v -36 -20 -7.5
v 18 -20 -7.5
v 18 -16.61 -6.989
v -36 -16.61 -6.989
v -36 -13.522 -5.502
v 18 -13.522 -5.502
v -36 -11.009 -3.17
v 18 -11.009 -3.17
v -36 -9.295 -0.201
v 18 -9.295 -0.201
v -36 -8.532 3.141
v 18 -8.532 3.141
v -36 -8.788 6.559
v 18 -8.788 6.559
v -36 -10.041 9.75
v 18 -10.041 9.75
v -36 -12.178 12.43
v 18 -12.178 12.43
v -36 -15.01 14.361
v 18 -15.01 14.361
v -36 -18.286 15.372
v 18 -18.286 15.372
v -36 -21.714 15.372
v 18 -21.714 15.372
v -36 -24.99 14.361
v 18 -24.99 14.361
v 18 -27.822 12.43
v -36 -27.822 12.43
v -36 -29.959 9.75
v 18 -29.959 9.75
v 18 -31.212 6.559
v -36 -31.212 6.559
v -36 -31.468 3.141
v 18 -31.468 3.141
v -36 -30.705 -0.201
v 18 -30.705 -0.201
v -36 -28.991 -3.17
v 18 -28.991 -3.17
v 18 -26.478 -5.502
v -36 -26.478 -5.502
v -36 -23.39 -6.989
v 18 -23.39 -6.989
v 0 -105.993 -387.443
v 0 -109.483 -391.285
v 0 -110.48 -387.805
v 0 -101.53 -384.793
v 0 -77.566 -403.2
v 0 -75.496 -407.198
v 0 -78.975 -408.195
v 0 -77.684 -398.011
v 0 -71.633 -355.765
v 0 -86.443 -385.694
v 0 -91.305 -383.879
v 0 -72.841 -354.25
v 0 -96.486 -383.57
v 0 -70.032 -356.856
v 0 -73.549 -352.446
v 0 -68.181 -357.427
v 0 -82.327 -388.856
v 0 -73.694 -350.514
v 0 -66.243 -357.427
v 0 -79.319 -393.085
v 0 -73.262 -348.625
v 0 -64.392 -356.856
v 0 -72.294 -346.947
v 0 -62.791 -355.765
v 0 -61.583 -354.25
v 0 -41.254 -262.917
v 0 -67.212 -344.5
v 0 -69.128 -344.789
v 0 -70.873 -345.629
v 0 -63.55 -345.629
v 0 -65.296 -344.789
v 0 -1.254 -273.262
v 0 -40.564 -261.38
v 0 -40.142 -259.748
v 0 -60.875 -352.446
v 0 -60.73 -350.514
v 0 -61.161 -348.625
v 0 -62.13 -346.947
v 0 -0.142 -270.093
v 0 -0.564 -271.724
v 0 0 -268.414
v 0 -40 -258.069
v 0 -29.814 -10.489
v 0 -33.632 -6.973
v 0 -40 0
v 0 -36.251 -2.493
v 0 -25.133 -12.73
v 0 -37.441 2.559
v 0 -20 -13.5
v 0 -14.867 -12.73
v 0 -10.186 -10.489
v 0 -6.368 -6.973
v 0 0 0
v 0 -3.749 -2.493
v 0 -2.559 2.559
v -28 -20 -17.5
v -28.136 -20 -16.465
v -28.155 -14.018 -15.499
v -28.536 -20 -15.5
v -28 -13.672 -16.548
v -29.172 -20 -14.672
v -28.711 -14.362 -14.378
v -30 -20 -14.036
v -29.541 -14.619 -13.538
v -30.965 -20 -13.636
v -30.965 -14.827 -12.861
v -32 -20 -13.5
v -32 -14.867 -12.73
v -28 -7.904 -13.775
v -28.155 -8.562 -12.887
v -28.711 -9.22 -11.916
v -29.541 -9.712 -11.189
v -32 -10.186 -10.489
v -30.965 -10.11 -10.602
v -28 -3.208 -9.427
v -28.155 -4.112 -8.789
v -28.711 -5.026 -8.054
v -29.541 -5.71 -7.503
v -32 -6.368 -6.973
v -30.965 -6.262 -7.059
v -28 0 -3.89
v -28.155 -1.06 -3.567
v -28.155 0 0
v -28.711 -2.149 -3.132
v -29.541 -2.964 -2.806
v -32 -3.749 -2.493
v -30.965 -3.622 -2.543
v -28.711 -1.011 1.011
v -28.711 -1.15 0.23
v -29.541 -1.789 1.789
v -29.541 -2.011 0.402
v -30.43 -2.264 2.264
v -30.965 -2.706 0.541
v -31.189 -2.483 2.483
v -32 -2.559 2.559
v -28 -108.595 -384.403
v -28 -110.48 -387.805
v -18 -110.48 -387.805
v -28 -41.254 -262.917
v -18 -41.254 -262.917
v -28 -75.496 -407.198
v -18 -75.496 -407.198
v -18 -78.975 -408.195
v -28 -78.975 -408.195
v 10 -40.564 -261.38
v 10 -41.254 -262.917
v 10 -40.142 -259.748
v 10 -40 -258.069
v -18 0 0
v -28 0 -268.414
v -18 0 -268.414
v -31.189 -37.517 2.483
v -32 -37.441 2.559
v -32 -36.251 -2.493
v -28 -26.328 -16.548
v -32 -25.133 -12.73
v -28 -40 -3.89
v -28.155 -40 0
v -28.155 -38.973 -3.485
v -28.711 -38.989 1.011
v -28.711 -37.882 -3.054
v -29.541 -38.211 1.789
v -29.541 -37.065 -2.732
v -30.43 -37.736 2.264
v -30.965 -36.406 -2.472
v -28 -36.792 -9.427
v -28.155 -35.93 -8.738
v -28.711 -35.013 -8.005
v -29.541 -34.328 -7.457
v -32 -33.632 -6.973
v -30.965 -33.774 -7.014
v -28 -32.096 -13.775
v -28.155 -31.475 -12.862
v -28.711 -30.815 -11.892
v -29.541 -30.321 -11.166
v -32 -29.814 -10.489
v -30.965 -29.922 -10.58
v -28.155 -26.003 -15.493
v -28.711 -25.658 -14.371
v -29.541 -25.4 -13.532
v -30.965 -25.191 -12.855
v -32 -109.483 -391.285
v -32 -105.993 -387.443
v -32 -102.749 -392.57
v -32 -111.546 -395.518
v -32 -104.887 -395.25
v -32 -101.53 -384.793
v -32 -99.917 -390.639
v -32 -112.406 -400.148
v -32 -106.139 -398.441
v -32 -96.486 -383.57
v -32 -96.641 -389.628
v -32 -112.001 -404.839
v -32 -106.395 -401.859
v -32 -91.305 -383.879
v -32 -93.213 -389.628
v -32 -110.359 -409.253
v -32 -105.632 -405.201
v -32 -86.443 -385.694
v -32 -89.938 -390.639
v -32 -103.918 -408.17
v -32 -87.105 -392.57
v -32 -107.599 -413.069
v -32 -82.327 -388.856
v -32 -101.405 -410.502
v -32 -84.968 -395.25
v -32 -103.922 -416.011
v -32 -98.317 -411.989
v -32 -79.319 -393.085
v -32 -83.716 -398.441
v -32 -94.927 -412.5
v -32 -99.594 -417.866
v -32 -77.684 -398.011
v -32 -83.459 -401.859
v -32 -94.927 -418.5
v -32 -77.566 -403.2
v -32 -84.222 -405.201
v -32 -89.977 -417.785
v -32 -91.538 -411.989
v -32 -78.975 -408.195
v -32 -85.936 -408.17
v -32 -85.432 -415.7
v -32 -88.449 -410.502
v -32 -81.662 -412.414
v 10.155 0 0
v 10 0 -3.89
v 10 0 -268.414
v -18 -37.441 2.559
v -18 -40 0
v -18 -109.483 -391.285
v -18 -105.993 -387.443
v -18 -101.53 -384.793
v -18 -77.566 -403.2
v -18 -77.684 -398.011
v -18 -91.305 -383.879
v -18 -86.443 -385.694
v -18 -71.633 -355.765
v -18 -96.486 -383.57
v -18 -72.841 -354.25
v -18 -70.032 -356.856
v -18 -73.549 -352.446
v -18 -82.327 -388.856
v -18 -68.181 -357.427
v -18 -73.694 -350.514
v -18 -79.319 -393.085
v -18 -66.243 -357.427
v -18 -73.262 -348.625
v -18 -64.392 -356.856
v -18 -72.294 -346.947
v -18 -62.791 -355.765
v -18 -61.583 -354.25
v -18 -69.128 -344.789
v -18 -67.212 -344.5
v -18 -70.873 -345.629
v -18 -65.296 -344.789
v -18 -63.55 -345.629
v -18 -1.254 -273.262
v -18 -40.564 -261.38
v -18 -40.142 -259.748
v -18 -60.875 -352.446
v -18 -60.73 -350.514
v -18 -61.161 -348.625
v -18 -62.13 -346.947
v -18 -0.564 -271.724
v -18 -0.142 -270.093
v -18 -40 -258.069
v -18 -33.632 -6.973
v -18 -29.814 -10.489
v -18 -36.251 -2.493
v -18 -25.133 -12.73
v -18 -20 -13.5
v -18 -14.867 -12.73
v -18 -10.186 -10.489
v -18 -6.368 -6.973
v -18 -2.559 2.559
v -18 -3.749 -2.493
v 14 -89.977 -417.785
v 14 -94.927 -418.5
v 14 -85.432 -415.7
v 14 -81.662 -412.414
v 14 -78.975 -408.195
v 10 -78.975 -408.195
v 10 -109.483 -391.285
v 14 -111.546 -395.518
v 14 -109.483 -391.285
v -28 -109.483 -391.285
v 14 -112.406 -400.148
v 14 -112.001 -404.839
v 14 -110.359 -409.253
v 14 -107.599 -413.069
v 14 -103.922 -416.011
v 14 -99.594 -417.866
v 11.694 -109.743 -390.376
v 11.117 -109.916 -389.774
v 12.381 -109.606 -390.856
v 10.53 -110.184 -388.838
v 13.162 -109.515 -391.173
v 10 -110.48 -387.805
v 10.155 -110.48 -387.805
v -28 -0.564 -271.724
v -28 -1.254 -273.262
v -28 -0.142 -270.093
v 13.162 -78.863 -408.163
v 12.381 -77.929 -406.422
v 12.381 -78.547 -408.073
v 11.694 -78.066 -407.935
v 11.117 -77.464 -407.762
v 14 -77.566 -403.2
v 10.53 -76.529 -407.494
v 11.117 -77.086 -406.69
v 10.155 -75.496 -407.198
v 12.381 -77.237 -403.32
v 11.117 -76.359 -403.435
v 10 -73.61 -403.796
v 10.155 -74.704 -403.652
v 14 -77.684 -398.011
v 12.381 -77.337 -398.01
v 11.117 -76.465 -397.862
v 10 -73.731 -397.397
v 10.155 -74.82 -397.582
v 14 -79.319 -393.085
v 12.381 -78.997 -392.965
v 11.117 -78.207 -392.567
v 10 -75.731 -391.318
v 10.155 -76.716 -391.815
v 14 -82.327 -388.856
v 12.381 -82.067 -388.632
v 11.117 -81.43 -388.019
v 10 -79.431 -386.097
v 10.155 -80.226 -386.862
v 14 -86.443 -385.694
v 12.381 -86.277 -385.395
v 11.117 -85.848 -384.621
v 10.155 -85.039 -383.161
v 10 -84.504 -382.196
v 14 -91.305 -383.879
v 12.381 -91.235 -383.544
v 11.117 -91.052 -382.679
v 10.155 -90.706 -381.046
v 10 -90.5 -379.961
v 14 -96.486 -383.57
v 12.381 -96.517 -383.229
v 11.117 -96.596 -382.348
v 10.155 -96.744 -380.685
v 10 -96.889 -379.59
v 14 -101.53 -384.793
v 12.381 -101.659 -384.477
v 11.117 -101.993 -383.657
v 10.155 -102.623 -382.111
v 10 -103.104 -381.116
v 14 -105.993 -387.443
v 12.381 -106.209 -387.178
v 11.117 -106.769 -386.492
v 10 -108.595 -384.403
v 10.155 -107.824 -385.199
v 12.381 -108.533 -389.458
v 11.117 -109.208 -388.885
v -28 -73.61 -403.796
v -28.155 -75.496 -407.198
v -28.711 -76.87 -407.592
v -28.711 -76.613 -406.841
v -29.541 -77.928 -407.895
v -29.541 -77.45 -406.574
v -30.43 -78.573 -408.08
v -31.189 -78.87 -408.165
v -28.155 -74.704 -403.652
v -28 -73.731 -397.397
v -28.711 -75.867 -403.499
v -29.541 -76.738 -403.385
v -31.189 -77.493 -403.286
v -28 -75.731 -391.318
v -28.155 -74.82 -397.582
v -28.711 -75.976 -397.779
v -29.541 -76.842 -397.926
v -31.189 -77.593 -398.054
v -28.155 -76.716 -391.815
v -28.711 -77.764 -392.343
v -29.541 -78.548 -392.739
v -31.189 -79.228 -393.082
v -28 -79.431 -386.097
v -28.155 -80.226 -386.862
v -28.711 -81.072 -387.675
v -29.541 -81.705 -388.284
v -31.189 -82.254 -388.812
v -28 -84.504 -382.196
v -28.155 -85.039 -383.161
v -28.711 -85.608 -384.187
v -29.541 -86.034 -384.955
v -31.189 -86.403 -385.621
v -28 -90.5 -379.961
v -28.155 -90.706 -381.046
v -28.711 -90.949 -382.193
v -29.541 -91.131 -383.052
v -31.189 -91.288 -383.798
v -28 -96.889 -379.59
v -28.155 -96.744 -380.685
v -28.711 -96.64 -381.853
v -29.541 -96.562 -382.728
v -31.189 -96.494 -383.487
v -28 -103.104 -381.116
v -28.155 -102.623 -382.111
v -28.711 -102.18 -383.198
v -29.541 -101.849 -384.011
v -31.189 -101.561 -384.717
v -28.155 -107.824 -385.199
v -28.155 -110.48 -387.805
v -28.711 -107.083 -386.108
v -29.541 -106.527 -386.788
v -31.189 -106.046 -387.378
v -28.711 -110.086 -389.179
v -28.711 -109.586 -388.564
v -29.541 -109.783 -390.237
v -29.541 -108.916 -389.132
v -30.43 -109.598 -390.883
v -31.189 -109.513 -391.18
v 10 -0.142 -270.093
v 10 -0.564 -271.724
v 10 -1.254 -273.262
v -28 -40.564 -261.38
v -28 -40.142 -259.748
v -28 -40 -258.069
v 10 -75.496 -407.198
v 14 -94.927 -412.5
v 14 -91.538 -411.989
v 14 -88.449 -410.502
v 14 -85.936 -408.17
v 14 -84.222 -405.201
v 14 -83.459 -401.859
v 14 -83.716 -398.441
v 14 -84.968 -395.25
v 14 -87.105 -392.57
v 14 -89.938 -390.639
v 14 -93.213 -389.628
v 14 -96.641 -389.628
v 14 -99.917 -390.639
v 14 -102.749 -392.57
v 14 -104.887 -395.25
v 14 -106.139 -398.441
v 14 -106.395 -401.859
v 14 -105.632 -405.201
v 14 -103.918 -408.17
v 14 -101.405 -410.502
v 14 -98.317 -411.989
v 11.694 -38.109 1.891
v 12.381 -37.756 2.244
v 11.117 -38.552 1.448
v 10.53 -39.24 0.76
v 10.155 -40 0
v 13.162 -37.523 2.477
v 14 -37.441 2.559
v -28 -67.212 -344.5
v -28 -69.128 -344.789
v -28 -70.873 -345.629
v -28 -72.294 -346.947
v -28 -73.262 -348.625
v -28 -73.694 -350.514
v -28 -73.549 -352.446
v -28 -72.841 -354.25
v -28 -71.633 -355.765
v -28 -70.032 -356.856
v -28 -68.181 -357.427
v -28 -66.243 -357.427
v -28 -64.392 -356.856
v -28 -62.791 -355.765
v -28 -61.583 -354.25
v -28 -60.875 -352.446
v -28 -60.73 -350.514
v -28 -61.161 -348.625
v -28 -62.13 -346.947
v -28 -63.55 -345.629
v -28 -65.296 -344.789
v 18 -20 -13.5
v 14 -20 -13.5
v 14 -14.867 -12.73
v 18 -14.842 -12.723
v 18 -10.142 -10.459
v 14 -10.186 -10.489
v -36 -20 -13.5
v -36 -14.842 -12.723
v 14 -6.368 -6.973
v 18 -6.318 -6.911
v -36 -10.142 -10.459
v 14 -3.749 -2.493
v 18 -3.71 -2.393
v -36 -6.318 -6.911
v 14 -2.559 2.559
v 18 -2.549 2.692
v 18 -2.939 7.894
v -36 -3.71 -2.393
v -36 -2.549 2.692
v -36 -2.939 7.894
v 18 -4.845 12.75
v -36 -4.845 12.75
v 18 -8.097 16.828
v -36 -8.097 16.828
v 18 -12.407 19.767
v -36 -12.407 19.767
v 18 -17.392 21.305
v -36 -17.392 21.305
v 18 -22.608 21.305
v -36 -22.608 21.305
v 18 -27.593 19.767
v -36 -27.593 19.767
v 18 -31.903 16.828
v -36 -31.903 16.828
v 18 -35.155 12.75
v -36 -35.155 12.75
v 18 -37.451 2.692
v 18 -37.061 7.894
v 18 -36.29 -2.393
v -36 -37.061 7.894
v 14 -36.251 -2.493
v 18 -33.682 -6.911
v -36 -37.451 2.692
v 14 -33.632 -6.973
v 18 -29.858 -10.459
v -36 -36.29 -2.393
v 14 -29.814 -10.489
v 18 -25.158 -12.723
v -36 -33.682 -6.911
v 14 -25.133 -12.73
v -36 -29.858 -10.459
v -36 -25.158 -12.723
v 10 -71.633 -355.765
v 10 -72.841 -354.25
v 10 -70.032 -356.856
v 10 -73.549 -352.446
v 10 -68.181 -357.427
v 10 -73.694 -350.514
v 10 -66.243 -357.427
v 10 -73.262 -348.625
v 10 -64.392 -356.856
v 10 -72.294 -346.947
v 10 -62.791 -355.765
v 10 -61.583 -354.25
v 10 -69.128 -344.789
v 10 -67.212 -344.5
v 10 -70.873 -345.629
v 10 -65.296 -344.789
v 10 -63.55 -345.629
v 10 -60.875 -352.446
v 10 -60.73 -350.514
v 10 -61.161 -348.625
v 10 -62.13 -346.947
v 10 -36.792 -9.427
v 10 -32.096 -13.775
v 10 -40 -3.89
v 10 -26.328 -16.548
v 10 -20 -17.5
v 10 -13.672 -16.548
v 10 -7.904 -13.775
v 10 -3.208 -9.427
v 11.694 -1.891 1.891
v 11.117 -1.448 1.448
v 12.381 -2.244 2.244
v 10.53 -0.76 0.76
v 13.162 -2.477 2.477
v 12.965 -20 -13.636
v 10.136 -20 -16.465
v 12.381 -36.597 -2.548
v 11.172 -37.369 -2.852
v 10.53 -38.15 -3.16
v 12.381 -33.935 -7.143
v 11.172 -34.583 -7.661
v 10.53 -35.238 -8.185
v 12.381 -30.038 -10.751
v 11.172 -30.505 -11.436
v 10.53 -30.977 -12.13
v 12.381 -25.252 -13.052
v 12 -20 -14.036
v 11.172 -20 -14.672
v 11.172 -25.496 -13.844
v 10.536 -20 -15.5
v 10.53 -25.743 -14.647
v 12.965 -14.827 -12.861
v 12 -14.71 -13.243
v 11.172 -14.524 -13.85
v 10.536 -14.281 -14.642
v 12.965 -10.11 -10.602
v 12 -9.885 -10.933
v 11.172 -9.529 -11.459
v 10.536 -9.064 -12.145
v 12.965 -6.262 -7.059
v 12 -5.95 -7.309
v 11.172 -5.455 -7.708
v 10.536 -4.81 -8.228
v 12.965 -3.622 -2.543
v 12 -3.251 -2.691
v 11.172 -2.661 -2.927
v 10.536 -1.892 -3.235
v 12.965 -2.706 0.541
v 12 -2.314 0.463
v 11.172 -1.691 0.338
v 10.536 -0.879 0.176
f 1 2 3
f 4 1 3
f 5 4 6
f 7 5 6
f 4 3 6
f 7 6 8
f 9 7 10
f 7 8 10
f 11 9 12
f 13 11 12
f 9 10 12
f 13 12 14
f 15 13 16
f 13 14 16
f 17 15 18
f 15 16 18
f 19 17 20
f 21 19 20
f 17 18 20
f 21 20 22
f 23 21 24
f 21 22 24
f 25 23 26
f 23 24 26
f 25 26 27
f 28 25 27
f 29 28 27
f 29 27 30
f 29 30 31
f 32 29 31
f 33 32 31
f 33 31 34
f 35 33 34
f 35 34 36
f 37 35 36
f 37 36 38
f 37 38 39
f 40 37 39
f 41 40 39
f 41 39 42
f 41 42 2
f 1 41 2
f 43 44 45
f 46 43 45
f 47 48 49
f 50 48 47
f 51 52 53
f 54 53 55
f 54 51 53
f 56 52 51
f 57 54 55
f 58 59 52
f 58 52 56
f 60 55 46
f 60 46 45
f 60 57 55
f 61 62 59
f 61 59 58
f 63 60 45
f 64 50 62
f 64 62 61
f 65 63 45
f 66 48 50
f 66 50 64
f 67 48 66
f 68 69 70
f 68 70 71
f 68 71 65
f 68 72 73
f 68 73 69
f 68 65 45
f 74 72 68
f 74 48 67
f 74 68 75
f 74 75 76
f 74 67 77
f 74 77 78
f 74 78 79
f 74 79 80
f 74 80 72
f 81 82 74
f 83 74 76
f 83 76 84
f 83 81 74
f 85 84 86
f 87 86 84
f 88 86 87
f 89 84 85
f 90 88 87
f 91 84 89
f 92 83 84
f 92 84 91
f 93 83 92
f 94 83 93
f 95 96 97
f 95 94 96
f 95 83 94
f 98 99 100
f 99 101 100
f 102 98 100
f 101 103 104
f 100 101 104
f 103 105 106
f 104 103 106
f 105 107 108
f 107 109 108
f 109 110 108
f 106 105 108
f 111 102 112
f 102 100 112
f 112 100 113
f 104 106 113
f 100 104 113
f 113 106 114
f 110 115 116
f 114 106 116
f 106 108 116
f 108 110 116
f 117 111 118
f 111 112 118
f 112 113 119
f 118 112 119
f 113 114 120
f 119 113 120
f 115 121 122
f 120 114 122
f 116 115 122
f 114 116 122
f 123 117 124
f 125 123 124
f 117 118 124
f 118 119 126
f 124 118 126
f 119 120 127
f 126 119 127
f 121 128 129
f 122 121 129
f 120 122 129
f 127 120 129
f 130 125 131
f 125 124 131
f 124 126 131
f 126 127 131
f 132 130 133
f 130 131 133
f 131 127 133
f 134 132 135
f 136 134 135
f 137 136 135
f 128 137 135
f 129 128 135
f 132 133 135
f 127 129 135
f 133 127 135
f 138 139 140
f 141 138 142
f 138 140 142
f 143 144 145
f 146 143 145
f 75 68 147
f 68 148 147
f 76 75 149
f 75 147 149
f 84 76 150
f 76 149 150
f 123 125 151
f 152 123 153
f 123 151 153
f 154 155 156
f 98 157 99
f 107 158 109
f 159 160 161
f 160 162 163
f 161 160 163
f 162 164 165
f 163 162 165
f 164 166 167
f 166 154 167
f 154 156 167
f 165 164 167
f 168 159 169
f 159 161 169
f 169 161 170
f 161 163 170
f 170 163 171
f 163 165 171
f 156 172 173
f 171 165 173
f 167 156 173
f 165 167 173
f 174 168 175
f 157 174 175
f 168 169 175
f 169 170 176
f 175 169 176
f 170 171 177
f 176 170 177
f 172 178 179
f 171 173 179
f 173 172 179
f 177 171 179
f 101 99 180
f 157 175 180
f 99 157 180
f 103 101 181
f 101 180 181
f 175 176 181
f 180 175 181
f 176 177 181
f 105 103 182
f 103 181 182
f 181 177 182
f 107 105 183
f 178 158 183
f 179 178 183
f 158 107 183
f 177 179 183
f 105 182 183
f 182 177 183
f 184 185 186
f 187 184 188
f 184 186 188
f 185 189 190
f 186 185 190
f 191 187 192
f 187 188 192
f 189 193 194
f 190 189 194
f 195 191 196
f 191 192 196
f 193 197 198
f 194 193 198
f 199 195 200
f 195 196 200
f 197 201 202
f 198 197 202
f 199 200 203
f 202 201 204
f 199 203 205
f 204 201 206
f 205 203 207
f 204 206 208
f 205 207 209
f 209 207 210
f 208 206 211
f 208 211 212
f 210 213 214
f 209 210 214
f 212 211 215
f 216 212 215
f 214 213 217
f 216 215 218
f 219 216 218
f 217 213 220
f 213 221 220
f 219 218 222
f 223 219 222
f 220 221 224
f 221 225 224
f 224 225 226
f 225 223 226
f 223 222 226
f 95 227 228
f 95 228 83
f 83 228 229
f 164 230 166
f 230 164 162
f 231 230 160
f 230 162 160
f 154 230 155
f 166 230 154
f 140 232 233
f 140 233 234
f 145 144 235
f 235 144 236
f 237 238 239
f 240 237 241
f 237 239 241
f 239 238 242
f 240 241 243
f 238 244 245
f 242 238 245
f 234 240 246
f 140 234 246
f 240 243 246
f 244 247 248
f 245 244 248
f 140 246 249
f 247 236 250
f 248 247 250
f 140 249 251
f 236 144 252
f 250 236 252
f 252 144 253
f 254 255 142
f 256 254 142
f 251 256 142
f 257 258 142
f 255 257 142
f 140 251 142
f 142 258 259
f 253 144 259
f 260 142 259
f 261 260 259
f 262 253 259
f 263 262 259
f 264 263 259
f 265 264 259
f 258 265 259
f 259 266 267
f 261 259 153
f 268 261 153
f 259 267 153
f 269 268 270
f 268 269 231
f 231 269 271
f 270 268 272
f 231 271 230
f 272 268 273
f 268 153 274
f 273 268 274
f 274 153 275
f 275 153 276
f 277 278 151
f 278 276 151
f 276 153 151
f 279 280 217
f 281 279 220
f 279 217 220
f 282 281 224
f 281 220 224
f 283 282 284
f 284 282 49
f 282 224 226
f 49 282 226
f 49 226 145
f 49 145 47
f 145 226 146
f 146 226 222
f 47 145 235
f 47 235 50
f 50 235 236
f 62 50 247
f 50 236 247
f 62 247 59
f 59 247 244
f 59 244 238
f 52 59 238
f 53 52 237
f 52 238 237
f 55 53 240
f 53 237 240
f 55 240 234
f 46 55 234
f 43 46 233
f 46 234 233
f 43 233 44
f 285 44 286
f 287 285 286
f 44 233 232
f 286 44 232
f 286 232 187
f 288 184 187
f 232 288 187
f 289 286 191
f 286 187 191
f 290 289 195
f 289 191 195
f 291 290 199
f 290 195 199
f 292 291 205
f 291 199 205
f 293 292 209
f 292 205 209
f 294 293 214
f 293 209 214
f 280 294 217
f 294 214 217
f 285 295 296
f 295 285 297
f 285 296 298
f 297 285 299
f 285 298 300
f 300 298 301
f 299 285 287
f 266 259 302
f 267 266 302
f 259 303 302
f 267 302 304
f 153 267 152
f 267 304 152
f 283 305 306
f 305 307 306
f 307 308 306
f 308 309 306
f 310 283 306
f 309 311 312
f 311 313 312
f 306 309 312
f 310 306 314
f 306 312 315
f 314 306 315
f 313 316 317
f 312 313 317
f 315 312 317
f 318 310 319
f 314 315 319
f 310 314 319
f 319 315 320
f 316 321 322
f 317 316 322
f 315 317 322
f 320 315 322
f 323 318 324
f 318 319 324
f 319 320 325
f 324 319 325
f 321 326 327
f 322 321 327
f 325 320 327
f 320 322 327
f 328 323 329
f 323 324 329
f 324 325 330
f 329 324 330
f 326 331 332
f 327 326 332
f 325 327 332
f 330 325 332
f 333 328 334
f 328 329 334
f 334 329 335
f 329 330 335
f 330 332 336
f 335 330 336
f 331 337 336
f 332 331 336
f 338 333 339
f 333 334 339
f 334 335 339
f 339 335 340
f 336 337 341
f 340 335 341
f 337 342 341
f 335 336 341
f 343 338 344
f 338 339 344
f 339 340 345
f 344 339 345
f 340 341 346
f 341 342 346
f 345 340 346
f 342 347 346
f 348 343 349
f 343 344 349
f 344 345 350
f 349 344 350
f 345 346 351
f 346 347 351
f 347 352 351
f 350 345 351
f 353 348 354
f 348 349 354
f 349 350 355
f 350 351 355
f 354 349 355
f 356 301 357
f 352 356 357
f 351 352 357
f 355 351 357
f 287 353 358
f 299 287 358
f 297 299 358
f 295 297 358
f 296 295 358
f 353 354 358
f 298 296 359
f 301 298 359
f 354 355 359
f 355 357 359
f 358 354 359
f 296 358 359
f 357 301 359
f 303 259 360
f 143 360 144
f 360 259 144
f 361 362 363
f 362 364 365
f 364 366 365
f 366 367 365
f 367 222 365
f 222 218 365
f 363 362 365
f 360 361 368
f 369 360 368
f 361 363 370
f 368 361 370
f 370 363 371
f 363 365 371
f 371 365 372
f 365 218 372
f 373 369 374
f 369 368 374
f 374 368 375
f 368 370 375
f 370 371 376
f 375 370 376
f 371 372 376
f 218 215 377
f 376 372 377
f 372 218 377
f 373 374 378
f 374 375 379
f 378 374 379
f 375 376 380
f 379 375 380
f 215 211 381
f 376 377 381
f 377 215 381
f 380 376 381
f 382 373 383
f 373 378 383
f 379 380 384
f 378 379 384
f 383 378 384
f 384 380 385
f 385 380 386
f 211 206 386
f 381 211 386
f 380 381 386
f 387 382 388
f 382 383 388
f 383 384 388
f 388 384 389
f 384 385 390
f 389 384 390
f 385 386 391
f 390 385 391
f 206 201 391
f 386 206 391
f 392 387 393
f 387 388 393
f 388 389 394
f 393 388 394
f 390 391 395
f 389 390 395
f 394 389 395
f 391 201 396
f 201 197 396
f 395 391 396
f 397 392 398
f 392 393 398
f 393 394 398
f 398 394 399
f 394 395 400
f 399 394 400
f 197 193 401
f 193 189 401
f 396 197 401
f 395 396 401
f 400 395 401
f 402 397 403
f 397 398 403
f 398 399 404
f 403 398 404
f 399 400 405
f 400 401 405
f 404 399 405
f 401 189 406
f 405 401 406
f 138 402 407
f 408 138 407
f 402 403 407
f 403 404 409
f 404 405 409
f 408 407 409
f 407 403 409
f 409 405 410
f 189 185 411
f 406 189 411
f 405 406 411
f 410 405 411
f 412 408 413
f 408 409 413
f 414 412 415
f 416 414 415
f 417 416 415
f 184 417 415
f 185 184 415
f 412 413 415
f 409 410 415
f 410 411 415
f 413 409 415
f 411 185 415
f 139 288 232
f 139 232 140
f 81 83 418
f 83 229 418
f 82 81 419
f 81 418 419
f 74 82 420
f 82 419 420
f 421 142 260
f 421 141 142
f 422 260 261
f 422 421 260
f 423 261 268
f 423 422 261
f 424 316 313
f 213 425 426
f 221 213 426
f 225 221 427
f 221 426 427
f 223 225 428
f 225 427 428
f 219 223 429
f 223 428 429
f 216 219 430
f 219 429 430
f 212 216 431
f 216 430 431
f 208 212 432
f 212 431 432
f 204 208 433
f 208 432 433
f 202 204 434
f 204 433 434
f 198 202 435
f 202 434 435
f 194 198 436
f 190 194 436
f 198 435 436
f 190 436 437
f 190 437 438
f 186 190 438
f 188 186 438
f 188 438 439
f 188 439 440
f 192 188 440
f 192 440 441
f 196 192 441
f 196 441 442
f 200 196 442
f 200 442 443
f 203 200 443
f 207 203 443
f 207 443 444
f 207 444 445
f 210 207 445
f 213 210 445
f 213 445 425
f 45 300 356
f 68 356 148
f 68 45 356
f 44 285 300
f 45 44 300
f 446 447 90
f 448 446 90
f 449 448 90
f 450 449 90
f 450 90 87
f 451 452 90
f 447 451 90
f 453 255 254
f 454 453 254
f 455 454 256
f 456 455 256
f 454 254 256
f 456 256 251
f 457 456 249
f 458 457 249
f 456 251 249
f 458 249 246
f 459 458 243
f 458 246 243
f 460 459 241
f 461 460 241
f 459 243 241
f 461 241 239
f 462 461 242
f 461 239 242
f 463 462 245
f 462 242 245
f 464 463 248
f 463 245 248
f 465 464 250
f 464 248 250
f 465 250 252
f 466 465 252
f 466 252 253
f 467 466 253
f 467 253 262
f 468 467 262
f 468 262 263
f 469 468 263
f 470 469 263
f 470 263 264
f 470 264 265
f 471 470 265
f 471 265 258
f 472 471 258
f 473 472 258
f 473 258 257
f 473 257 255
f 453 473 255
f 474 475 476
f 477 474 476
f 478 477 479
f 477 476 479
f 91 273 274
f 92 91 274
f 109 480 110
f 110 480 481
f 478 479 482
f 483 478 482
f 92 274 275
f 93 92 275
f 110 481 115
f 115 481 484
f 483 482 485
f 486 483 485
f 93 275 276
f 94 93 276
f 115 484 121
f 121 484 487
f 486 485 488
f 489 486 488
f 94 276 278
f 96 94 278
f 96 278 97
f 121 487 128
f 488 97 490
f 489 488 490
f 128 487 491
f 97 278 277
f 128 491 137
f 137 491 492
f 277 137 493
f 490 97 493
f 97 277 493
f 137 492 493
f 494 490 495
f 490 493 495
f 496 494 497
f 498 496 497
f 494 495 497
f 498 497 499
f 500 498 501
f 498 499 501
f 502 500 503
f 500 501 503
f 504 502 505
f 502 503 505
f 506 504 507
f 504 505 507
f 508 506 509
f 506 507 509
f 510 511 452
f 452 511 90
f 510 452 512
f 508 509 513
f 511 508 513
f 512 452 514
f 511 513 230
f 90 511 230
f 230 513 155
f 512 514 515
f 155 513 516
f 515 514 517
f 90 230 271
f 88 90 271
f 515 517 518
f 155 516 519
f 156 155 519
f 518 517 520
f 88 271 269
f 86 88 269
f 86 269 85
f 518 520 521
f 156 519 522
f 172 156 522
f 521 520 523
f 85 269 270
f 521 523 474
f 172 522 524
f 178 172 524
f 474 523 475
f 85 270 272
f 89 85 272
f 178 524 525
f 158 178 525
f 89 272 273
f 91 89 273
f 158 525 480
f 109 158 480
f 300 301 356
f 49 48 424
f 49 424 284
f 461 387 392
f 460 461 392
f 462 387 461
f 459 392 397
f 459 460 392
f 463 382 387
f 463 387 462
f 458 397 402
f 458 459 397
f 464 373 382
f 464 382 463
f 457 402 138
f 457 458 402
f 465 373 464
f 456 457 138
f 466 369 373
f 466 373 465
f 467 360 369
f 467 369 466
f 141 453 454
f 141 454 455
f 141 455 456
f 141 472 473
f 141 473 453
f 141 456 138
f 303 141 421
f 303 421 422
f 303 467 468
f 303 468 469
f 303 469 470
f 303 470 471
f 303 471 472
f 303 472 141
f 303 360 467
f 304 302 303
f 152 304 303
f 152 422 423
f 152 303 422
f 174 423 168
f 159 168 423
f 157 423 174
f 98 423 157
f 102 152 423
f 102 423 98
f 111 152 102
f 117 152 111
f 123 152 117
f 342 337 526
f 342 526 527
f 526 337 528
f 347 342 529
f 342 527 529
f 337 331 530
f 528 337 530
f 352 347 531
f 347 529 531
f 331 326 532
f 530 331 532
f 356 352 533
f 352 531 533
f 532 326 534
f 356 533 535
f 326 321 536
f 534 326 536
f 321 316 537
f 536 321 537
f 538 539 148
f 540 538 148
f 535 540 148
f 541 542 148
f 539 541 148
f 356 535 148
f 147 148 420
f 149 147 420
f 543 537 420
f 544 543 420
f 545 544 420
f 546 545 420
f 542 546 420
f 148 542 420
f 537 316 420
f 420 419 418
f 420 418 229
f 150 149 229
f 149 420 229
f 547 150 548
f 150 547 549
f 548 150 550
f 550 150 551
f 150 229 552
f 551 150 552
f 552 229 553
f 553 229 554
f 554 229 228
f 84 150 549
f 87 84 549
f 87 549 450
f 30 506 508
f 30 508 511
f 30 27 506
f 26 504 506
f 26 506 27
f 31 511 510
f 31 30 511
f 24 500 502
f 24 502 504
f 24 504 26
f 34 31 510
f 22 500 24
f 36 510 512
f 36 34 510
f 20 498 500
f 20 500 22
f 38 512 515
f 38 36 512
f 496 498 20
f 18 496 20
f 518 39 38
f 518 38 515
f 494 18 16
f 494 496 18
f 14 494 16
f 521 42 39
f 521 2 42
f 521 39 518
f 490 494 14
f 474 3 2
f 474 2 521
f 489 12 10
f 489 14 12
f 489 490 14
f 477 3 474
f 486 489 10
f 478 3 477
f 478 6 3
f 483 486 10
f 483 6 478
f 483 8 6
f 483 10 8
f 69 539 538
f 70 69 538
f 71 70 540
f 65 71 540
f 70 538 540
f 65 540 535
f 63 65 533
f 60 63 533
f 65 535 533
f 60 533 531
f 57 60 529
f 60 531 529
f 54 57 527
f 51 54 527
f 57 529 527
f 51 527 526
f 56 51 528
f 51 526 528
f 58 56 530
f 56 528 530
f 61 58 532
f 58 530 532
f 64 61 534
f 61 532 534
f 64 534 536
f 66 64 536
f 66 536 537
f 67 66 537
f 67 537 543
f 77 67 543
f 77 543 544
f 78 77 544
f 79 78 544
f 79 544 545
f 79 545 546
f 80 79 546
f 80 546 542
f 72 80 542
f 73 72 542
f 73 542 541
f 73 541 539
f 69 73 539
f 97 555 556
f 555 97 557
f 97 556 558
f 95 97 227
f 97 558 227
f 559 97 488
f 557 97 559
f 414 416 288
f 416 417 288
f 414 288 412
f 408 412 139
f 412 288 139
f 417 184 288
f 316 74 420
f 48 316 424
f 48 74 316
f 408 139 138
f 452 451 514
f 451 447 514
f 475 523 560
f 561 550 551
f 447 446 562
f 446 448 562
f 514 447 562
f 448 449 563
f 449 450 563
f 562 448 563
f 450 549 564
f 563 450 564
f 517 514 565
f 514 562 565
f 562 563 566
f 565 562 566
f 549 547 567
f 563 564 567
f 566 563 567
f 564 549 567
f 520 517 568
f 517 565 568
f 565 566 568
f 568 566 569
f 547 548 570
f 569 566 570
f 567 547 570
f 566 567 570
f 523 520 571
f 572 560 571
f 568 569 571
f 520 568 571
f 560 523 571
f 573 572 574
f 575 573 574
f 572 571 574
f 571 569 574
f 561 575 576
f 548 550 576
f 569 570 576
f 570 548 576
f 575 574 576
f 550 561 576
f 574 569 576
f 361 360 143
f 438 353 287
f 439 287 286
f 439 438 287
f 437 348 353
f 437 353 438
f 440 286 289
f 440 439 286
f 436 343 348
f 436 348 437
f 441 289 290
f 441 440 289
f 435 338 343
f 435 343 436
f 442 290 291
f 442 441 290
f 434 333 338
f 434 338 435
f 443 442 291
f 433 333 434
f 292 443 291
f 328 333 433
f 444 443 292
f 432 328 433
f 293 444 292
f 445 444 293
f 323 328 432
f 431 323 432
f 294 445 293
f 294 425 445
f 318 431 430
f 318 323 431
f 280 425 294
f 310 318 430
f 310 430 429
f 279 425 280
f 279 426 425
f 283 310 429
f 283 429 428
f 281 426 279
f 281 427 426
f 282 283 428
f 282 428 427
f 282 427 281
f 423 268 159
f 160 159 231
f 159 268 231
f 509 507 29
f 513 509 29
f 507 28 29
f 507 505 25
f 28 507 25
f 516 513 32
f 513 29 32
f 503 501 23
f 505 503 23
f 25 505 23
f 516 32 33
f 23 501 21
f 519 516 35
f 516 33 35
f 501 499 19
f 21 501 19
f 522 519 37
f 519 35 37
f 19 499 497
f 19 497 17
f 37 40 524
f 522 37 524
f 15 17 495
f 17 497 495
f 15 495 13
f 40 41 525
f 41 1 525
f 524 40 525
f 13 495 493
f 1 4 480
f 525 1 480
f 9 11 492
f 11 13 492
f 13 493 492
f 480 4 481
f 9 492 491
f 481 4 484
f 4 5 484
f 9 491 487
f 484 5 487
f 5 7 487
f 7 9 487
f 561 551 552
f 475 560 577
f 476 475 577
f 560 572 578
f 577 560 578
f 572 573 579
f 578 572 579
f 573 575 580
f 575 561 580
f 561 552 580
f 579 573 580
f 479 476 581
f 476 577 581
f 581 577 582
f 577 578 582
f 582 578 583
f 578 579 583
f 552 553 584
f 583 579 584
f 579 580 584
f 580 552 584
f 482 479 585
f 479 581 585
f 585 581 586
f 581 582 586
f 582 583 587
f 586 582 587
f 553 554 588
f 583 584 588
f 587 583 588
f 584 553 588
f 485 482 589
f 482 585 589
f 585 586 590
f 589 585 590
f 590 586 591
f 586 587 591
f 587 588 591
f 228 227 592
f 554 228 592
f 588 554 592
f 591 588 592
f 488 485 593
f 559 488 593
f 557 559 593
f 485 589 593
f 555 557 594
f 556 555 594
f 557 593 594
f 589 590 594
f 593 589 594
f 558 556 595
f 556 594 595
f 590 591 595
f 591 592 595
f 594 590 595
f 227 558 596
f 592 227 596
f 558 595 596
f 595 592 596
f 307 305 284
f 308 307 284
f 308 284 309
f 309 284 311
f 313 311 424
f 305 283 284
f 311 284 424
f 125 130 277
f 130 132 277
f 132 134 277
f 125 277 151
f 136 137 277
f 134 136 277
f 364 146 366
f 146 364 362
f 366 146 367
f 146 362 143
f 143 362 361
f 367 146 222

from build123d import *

# Parameters (mm, degrees)
DODANIE_WYCI_GNI_CIE1_DEPTH      = 10
DODANIE_WYCI_GNI_CIE2_DEPTH      = 8
DODANIE_WYCI_GNI_CIE2_DEPTH_BACK = 46
SZKIC2_R                         = 17.5
DODANIE_WYCI_GNI_CIE3_DEPTH      = 4
DODANIE_WYCI_GNI_CIE3_DEPTH_BACK = 42
SZKIC3_R                         = 17.5
WYTNIJ_WYCI_GNI_CIE1_REACH       = 438.69
SZKIC4_R                         = 11.5
WYTNIJ_WYCI_GNI_CIE2_REACH       = 438.213
SZKIC5_R                         = 11.5
ZAOKR_GLENIE1_R                  = 4
ZAOKR_GLENIE2_R                  = 10
SZKIC7_R                         = 6.5
WYTNIJ_WYCI_GNI_CIE3_DEPTH       = 436.773035366


with BuildPart() as part:
    # Szkic1 → Dodanie-wyciągnięcie1 (new body)
    with BuildSketch(Plane(origin=(0, 0, 0), x_dir=(0, 0, -1), z_dir=(1, 0, 0))):
        Polygon((0, 0), (271, 0), (407.197713576, -75.495625423), (408.756953924, -80.933342732), (393.243046076, -108.921173361), (387.805328767, -110.480413708), (260.655296626, -40), (0, -40), (-4, -36), (-4, -4), align=None)
    extrude(amount=DODANIE_WYCI_GNI_CIE1_DEPTH)


with BuildPart() as body_2:
    # Lustro3: mirrored copy
    add(part.part.mirror(Plane.ZY.offset(9)))


with BuildPart() as part_1:
    add(part.part)

    add(body_2.part)  # Dodanie-wyciągnięcie2 merges body 2
    # Szkic2 → Dodanie-wyciągnięcie2 (add, two sides: drawn at the far end of the back side and taken through both)
    with BuildSketch(Plane(origin=(10, 0, 0), x_dir=(0, 0, -1), z_dir=(1, 0, 0)).offset(-DODANIE_WYCI_GNI_CIE2_DEPTH_BACK)):
        with Locations((-4, -20)):
            Circle(SZKIC2_R)
    extrude(amount=DODANIE_WYCI_GNI_CIE2_DEPTH + DODANIE_WYCI_GNI_CIE2_DEPTH_BACK)

    # Szkic3 → Dodanie-wyciągnięcie3 (add, two sides: drawn at the far end of the back side and taken through both)
    with BuildSketch(Plane(origin=(10, 0, 0), x_dir=(0, 0, -1), z_dir=(1, 0, 0)).offset(-DODANIE_WYCI_GNI_CIE3_DEPTH_BACK)):
        with Locations((401, -94.927258046)):
            Circle(SZKIC3_R)
    extrude(amount=DODANIE_WYCI_GNI_CIE3_DEPTH + DODANIE_WYCI_GNI_CIE3_DEPTH_BACK)

    # Szkic4 → Wytnij-wyciągnięcie1 (cut, up to next)
    with BuildSketch(Plane(origin=(18, 0, 0), x_dir=(0, 0, -1), z_dir=(1, 0, 0)), mode=Mode.PRIVATE) as wytnij_wyci_gni_cie1_sk1:
        with Locations((-4, -20)):
            Circle(SZKIC4_R)
    wytnij_wyci_gni_cie1_tool1 = extrude(wytnij_wyci_gni_cie1_sk1.sketch, amount=-WYTNIJ_WYCI_GNI_CIE1_REACH, mode=Mode.PRIVATE) & part_1.part
    add(wytnij_wyci_gni_cie1_tool1.solids().sort_by_distance((18, -20, 4))[0], mode=Mode.SUBTRACT)

    # Szkic5 → Wytnij-wyciągnięcie2 (cut, up to next)
    with BuildSketch(Plane(origin=(14, 0, 0), x_dir=(0, 0, -1), z_dir=(1, 0, 0)), mode=Mode.PRIVATE) as wytnij_wyci_gni_cie2_sk1:
        with Locations((401, -94.927258046)):
            Circle(SZKIC5_R)
    wytnij_wyci_gni_cie2_tool1 = extrude(wytnij_wyci_gni_cie2_sk1.sketch, amount=-WYTNIJ_WYCI_GNI_CIE2_REACH, mode=Mode.PRIVATE) & part_1.part
    add(wytnij_wyci_gni_cie2_tool1.solids().sort_by_distance((14, -94.927258, -401))[0], mode=Mode.SUBTRACT)

    # Zaokrąglenie1
    # the kernel refuses this fillet: 4 mm, written as the material it adds along each edge
    with BuildSketch(Plane(origin=(-28, -94.927258046, -401), x_dir=(0, 0.5436759874947165, -0.8392951927788249), z_dir=(0, -0.8392951927788249, -0.5436759874947165))) as zaokr_glenie1_piece_1_section:
        with BuildLine():
            CenterArc((17.5 + ZAOKR_GLENIE1_R, -ZAOKR_GLENIE1_R), ZAOKR_GLENIE1_R, 90, 90)
            Line((17.5 + ZAOKR_GLENIE1_R, 0), (17.5, 0))
            Line((17.5, 0), (17.5, -ZAOKR_GLENIE1_R))
        make_face()
    zaokr_glenie1_piece_1 = revolve(axis=Axis((-28, -94.927258046, -401), (1, 0, 0)), revolution_arc=236.131536778, mode=Mode.PRIVATE)
    zaokr_glenie1_piece_1 = split(zaokr_glenie1_piece_1, bisect_by=Plane(origin=(-29.129078487, -79.146319532, -408.244533267), z_dir=(0, -0.27563735581700194, 0.9612616959383181)), keep=Keep.TOP, mode=Mode.PRIVATE)
    zaokr_glenie1_piece_1 = split(zaokr_glenie1_piece_1, bisect_by=Plane(origin=(-29.129078487, -109.433594017, -391.456022876), z_dir=(0, 0.961261695938321, 0.2756373558169916)), keep=Keep.TOP, mode=Mode.PRIVATE)
    zaokr_glenie1_piece_1 = split(zaokr_glenie1_piece_1, bisect_by=Plane(origin=(-29.129078487, -103.388095722, -375.010448424), z_dir=(0, 0.8746197071393952, -0.4848096202463382)), keep=Keep.TOP, mode=Mode.PRIVATE)
    zaokr_glenie1_piece_1 = split(zaokr_glenie1_piece_1, bisect_by=Plane(origin=(-29.129078487, -68.403307437, -394.402833234), z_dir=(0, -0.8746197071393943, 0.4848096202463399)), keep=Keep.TOP, mode=Mode.PRIVATE)
    add(zaokr_glenie1_piece_1)
    with BuildSketch(Plane(origin=(-28, -20, 4), x_dir=(0, -0.8826991233352643, 0.469938567967299), z_dir=(0, 0.469938567967299, 0.8826991233352643))) as zaokr_glenie1_piece_2_section:
        with BuildLine():
            CenterArc((17.5 + ZAOKR_GLENIE1_R, -ZAOKR_GLENIE1_R), ZAOKR_GLENIE1_R, 90, 90)
            Line((17.5 + ZAOKR_GLENIE1_R, 0), (17.5, 0))
            Line((17.5, 0), (17.5, -ZAOKR_GLENIE1_R))
        make_face()
    zaokr_glenie1_piece_2 = revolve(axis=Axis((-28, -20, 4), (1, 0, 0)), revolution_arc=118.030308923, mode=Mode.PRIVATE)
    zaokr_glenie1_piece_2 = split(zaokr_glenie1_piece_2, bisect_by=Plane(origin=(-29.137845044, -41.167759306, -1.167759306), z_dir=(0, 0.7071067811865419, -0.7071067811865531)), keep=Keep.TOP, mode=Mode.PRIVATE)
    zaokr_glenie1_piece_2 = split(zaokr_glenie1_piece_2, bisect_by=Plane(origin=(-29.137845044, -40, -9.710667039), z_dir=(0, 1, 0)), keep=Keep.TOP, mode=Mode.PRIVATE)
    add(zaokr_glenie1_piece_2)
    with BuildSketch(Plane(origin=(10, -20, 4), x_dir=(0, -0.8826991233352602, 0.46993856796730693), z_dir=(0, 0.46993856796730693, 0.8826991233352602))) as zaokr_glenie1_piece_3_section:
        with BuildLine():
            CenterArc((17.5 + ZAOKR_GLENIE1_R, ZAOKR_GLENIE1_R), ZAOKR_GLENIE1_R, 180, 90)
            Line((17.5, ZAOKR_GLENIE1_R), (17.5, 0))
            Line((17.5, 0), (17.5 + ZAOKR_GLENIE1_R, 0))
        make_face()
    zaokr_glenie1_piece_3 = revolve(axis=Axis((10, -20, 4), (1, 0, 0)), revolution_arc=118.030308923, mode=Mode.PRIVATE)
    zaokr_glenie1_piece_3 = split(zaokr_glenie1_piece_3, bisect_by=Plane(origin=(11.137845044, -41.167759305, -1.167759305), z_dir=(0, 0.7071067811865419, -0.7071067811865531)), keep=Keep.TOP, mode=Mode.PRIVATE)
    zaokr_glenie1_piece_3 = split(zaokr_glenie1_piece_3, bisect_by=Plane(origin=(11.137845044, -40, -9.710667039), z_dir=(0, 1, 0)), keep=Keep.TOP, mode=Mode.PRIVATE)
    add(zaokr_glenie1_piece_3)
    with BuildSketch(Plane(origin=(10, -94.927258046, -401), x_dir=(0, 0.5436759874947362, -0.8392951927788123), z_dir=(0, -0.8392951927788123, -0.5436759874947362))) as zaokr_glenie1_piece_4_section:
        with BuildLine():
            CenterArc((17.5 + ZAOKR_GLENIE1_R, ZAOKR_GLENIE1_R), ZAOKR_GLENIE1_R, 180, 90)
            Line((17.5, ZAOKR_GLENIE1_R), (17.5, 0))
            Line((17.5, 0), (17.5 + ZAOKR_GLENIE1_R, 0))
        make_face()
    zaokr_glenie1_piece_4 = revolve(axis=Axis((10, -94.927258046, -401), (1, 0, 0)), revolution_arc=236.131536778, mode=Mode.PRIVATE)
    zaokr_glenie1_piece_4 = split(zaokr_glenie1_piece_4, bisect_by=Plane(origin=(11.12907849, -68.403307435, -394.402833232), z_dir=(0, -0.8746197071393943, 0.4848096202463399)), keep=Keep.TOP, mode=Mode.PRIVATE)
    zaokr_glenie1_piece_4 = split(zaokr_glenie1_piece_4, bisect_by=Plane(origin=(11.12907849, -103.388095721, -375.010448422), z_dir=(0, 0.8746197071393952, -0.4848096202463382)), keep=Keep.TOP, mode=Mode.PRIVATE)
    zaokr_glenie1_piece_4 = split(zaokr_glenie1_piece_4, bisect_by=Plane(origin=(11.12907849, -109.433594018, -391.456022874), z_dir=(0, 0.961261695938321, 0.2756373558169916)), keep=Keep.TOP, mode=Mode.PRIVATE)
    zaokr_glenie1_piece_4 = split(zaokr_glenie1_piece_4, bisect_by=Plane(origin=(11.12907849, -79.14631953, -408.244533267), z_dir=(0, -0.27563735581700194, 0.9612616959383181)), keep=Keep.TOP, mode=Mode.PRIVATE)
    add(zaokr_glenie1_piece_4)
    with BuildSketch(Plane(origin=(10, -20, 4), x_dir=(0, 0, -1), z_dir=(0, -1, 0))) as zaokr_glenie1_piece_5_section:
        with BuildLine():
            CenterArc((17.5 + ZAOKR_GLENIE1_R, ZAOKR_GLENIE1_R), ZAOKR_GLENIE1_R, 180, 90)
            Line((17.5, ZAOKR_GLENIE1_R), (17.5, 0))
            Line((17.5, 0), (17.5 + ZAOKR_GLENIE1_R, 0))
        make_face()
    zaokr_glenie1_piece_5 = revolve(axis=Axis((10, -20, 4), (1, 0, 0)), revolution_arc=118.030308923, mode=Mode.PRIVATE)
    zaokr_glenie1_piece_5 = split(zaokr_glenie1_piece_5, bisect_by=Plane(origin=(11.137845049, 0, -9.710667043), z_dir=(0, -1, 0)), keep=Keep.TOP, mode=Mode.PRIVATE)
    zaokr_glenie1_piece_5 = split(zaokr_glenie1_piece_5, bisect_by=Plane(origin=(11.137845049, 1.167759309, -1.167759309), z_dir=(0, -0.7071067811865533, -0.7071067811865418)), keep=Keep.TOP, mode=Mode.PRIVATE)
    add(zaokr_glenie1_piece_5)
    with BuildSketch(Plane(origin=(-28, -20, 4), x_dir=(0, 0, -1), z_dir=(0, -1, 0))) as zaokr_glenie1_piece_6_section:
        with BuildLine():
            CenterArc((17.5 + ZAOKR_GLENIE1_R, -ZAOKR_GLENIE1_R), ZAOKR_GLENIE1_R, 90, 90)
            Line((17.5 + ZAOKR_GLENIE1_R, 0), (17.5, 0))
            Line((17.5, 0), (17.5, -ZAOKR_GLENIE1_R))
        make_face()
    zaokr_glenie1_piece_6 = revolve(axis=Axis((-28, -20, 4), (1, 0, 0)), revolution_arc=118.030308923, mode=Mode.PRIVATE)
    zaokr_glenie1_piece_6 = split(zaokr_glenie1_piece_6, bisect_by=Plane(origin=(-29.137845048, 1.167759309, -1.167759309), z_dir=(0, -0.7071067811865533, -0.7071067811865418)), keep=Keep.TOP, mode=Mode.PRIVATE)
    zaokr_glenie1_piece_6 = split(zaokr_glenie1_piece_6, bisect_by=Plane(origin=(-29.137845048, 0, -9.710667042), z_dir=(0, -1, 0)), keep=Keep.TOP, mode=Mode.PRIVATE)
    add(zaokr_glenie1_piece_6)

    # Zaokrąglenie2
    zaokr_glenie2_edges = [part_1.edges().sort_by_distance(p)[0] for p in [
        (5, 0, -271),
        (5, -40, -260.655296626),
        (-23, -40, -260.655296626),
        (-23, 0, -271),
    ]]
    fillet(zaokr_glenie2_edges, radius=ZAOKR_GLENIE2_R)

    # Szkic7 → Wytnij-wyciągnięcie3 (cut, through all)
    with BuildSketch(Plane(origin=(10, 0, 0), x_dir=(0, 0, -1), z_dir=(1, 0, 0))):
        with Locations(Location((351, -67.211805474, 0), (0, 0, 180))):
            Circle(SZKIC7_R)
    extrude(amount=-WYTNIJ_WYCI_GNI_CIE3_DEPTH, mode=Mode.SUBTRACT)


solid = part_1.part
